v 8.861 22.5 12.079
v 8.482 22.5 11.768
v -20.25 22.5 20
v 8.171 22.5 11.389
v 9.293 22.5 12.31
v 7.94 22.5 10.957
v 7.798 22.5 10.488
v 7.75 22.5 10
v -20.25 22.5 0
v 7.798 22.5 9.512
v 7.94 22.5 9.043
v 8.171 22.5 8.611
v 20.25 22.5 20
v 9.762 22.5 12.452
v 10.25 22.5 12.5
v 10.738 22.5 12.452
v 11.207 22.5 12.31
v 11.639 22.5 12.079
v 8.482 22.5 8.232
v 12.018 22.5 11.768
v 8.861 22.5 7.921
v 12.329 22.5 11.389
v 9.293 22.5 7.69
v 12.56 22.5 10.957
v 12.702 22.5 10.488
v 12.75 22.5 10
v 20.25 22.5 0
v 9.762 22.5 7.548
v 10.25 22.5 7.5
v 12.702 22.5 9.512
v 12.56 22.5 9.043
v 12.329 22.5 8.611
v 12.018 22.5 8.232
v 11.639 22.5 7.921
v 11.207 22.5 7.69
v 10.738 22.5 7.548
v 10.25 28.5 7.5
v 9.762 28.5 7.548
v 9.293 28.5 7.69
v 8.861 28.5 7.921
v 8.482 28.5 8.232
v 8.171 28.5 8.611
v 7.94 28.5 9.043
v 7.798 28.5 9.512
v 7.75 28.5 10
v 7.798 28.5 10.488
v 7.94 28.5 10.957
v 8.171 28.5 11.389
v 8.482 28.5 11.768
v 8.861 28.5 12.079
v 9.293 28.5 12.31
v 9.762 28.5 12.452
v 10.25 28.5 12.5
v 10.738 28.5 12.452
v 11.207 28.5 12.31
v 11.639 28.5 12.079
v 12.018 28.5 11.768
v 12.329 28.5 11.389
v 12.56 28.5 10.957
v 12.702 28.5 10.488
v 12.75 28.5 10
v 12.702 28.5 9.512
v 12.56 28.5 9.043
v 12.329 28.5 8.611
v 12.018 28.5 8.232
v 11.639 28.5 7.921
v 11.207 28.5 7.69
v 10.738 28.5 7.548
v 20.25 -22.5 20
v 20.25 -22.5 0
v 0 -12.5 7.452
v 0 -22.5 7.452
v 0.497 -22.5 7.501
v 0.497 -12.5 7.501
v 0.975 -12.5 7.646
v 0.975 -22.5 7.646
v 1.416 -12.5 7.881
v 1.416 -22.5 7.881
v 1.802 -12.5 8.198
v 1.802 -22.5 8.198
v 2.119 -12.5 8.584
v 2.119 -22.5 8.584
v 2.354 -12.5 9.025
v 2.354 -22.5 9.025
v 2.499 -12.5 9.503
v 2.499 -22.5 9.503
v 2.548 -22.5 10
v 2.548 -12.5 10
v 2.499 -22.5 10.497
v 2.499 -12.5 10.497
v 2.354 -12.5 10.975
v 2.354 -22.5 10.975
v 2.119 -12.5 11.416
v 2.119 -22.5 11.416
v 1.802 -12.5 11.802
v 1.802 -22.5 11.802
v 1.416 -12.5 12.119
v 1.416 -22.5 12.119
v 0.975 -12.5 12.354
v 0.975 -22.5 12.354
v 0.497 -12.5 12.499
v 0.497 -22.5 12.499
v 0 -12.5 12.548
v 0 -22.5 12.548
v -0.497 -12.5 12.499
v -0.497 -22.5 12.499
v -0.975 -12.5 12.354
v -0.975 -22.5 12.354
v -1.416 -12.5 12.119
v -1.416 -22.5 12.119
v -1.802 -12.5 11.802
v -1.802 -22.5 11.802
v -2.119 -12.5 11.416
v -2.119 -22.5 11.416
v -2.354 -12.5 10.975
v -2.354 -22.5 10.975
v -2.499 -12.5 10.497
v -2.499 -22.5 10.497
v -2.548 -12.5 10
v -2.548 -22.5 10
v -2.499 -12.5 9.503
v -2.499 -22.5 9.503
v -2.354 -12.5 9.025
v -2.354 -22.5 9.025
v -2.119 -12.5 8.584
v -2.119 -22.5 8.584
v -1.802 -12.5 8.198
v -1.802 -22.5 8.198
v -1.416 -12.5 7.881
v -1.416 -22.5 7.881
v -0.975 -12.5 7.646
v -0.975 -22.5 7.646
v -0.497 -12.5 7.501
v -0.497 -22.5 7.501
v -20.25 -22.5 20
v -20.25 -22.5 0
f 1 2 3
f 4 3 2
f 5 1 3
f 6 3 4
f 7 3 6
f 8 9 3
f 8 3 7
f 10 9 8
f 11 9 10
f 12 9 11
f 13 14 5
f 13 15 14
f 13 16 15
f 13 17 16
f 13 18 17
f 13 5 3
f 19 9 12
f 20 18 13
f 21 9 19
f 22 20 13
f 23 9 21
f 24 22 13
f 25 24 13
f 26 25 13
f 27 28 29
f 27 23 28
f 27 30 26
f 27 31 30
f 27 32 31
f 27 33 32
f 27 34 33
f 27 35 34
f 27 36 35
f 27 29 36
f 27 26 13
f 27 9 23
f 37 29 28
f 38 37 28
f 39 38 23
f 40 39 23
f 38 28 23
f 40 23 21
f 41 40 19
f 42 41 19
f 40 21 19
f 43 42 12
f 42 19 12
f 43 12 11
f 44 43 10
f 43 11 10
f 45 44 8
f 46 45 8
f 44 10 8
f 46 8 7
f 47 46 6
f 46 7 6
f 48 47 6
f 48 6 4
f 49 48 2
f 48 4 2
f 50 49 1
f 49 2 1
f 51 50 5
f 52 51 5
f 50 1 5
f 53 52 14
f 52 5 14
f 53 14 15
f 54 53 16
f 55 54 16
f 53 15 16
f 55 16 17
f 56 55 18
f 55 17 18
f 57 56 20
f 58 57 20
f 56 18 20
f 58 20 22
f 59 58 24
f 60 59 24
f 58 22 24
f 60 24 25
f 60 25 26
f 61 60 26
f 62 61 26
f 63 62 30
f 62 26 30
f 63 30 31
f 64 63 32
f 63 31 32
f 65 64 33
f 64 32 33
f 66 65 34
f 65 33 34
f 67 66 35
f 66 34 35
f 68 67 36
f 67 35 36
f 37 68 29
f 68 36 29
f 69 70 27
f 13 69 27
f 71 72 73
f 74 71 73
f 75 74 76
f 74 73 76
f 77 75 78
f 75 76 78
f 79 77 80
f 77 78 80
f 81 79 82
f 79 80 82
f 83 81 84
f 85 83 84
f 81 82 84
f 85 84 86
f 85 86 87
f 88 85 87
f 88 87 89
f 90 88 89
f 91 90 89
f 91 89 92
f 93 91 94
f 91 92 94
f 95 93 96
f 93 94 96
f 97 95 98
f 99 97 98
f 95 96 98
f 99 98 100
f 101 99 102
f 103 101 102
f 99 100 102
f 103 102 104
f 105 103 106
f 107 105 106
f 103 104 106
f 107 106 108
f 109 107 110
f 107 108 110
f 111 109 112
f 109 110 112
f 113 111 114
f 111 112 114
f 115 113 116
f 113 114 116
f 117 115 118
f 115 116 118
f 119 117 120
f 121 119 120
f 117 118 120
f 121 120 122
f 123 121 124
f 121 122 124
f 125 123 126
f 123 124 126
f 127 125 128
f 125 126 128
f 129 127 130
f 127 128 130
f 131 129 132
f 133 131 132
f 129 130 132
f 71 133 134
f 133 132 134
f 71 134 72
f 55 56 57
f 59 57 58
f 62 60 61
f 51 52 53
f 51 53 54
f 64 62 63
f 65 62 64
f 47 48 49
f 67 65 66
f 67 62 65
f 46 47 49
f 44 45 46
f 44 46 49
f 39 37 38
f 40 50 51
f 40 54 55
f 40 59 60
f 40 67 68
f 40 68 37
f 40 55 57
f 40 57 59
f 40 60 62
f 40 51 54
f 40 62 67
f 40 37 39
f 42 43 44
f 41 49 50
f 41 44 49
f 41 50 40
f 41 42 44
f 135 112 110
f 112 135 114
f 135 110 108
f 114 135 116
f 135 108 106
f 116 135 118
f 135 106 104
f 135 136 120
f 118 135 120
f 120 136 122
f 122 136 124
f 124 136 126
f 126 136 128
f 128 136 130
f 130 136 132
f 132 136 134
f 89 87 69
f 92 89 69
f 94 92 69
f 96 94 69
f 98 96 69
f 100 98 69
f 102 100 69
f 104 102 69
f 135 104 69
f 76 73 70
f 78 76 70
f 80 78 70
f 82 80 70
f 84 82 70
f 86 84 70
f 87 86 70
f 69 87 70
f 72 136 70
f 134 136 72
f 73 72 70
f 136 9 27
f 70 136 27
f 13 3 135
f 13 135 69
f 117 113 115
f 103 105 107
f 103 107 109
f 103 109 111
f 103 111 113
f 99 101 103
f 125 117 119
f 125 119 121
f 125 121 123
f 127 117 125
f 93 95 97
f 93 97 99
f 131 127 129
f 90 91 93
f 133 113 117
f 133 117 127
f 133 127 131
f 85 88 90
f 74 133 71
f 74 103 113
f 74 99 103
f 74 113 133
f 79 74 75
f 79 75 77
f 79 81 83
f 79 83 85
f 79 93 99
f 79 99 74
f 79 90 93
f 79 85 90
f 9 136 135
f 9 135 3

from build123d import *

# Parameters (mm, degrees)
SKETCH1_W           = 40.5
SKETCH1_H           = 45
BOSS_EXTRUDE1_DEPTH = 20
SKETCH2_R           = 2.5
BOSS_EXTRUDE2_DEPTH = 6
SKETCH3_R           = 2.548450287
CUT_EXTRUDE1_DEPTH  = 10


with BuildPart() as part:
    # Sketch1 → Boss-Extrude1 (new body)
    with BuildSketch(Plane.XY):
        Rectangle(SKETCH1_W, SKETCH1_H)
    extrude(amount=BOSS_EXTRUDE1_DEPTH)

    # Sketch2 → Boss-Extrude2 (add)
    with BuildSketch(Plane(origin=(0, 22.5, 0), x_dir=(1, 0, 0), z_dir=(0, 1, 0))):
        with Locations(Location((10.25, -10, 0), (0, 0, 90))):
            Circle(SKETCH2_R)
    extrude(amount=BOSS_EXTRUDE2_DEPTH)

    # Sketch3 → Cut-Extrude1 (cut)
    with BuildSketch(Plane(origin=(0, -22.5, 0), x_dir=(-1, 0, 0), z_dir=(0, -1, 0))):
        with Locations(Location((0, -10, 0), (0, 0, 90))):
            Circle(SKETCH3_R)
    extrude(amount=-CUT_EXTRUDE1_DEPTH, mode=Mode.SUBTRACT)


solid = part.part
